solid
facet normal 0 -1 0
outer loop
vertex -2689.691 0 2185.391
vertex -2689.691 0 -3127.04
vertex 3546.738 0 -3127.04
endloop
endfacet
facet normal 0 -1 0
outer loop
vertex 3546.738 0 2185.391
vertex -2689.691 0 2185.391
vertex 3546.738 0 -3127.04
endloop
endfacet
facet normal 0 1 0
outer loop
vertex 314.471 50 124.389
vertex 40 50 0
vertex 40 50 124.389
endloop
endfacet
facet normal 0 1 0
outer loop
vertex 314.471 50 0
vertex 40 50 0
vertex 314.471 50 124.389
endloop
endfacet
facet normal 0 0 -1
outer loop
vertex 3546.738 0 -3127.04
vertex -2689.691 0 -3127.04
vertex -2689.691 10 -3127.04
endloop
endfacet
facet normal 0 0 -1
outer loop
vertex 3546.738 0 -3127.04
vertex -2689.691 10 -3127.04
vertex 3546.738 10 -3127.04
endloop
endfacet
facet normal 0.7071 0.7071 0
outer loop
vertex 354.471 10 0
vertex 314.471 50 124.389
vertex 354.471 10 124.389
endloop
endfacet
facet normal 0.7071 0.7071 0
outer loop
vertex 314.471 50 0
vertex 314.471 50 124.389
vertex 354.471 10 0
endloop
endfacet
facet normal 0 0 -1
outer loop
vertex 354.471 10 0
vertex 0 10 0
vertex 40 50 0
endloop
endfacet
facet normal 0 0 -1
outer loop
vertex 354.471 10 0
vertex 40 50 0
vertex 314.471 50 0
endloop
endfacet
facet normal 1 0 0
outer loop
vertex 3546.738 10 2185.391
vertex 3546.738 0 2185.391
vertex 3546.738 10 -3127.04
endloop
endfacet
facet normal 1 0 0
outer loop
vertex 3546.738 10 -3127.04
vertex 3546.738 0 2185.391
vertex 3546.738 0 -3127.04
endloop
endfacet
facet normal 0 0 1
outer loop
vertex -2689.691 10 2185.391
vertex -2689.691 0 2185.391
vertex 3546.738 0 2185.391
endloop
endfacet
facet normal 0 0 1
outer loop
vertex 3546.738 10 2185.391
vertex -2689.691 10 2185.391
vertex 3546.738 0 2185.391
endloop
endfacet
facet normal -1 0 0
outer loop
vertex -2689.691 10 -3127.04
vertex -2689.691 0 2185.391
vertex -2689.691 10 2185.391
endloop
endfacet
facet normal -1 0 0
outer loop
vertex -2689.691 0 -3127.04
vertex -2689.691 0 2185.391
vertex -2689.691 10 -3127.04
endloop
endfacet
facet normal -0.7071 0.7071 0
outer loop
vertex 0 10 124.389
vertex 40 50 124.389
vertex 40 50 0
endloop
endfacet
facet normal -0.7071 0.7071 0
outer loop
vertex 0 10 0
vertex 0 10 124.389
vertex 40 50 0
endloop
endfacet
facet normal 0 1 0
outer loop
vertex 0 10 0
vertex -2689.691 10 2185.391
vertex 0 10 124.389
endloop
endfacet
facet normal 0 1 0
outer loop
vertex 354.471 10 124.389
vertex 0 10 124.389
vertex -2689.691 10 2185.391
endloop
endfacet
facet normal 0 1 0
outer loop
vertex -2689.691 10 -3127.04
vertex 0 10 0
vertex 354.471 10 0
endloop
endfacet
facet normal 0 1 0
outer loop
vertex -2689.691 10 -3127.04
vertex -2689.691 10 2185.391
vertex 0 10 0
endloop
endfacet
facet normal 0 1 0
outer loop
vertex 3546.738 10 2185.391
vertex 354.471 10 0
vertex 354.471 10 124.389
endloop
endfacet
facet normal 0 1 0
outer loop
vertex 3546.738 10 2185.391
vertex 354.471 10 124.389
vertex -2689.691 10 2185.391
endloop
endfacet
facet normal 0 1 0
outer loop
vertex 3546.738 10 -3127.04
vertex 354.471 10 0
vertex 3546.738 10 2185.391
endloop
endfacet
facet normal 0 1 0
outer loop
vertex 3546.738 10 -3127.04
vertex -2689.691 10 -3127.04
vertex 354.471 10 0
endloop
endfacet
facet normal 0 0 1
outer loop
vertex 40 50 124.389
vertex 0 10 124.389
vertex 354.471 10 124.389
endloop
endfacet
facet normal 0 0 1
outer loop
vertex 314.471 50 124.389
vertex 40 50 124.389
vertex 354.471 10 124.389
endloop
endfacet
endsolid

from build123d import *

# Parameters (mm, degrees)
SKETCH1_W           = 6236.428790575
SKETCH1_H           = 5312.431817201
BOSS_EXTRUDE1_DEPTH = 10
SKETCH2_W           = 354.470716076
SKETCH2_H           = 124.389132605
BOSS_EXTRUDE2_DEPTH = 40
CHAMFER1_SIZE       = 40


with BuildPart() as part:
    # Sketch1 → Boss-Extrude1 (new body)
    with BuildSketch(Plane(origin=(0, 0, 0), x_dir=(1, 0, 0), z_dir=(0, 1, 0))):
        with Locations((428.523573662, 470.824447086)):
            Rectangle(SKETCH1_W, SKETCH1_H)
    extrude(amount=BOSS_EXTRUDE1_DEPTH)

    # Sketch2 → Boss-Extrude2 (add)
    with BuildSketch(Plane(origin=(0, 10, 0), x_dir=(1, 0, 0), z_dir=(0, 1, 0))):
        with Locations((177.235358038, -62.194566303)):
            Rectangle(SKETCH2_W, SKETCH2_H)
    extrude(amount=BOSS_EXTRUDE2_DEPTH)

    # Chamfer1
    chamfer1_edges = [part.edges().sort_by_distance(p)[0] for p in [
        (354.470716076, 50, 62.194566303),
        (0, 50, 62.194566303),
    ]]
    chamfer(chamfer1_edges, length=CHAMFER1_SIZE - 0.0001)  # a hair under: the kernel refuses the full size


solid = part.part
